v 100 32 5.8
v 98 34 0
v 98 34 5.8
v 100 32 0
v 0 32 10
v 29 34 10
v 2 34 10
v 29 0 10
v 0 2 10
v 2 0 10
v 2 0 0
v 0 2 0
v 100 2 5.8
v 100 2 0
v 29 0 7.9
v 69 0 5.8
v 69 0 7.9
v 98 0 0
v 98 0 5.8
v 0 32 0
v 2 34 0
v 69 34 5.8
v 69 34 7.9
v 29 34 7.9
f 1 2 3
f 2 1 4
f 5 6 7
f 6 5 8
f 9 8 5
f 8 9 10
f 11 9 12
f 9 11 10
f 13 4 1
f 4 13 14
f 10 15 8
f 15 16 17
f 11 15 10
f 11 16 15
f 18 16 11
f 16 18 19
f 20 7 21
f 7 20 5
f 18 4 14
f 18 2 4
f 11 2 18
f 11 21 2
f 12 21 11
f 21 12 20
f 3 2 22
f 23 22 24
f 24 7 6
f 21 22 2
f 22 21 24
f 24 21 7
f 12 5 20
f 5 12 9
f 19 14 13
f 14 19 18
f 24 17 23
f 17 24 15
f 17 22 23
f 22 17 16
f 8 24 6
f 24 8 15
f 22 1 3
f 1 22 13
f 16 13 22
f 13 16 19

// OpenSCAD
$fn = 32;

// ----------------------------------------------------------------------
// Stepped bar: twostep, 100 x 34 x 10/5.8 mm
// ----------------------------------------------------------------------

// --- parameters (mm) ---
bar_l = 100;              // bar length, X
bar_w = 34;               // bar width, Y
plate_t = 10;             // thickness of the thick zone, Z
thin_t = 5.8;             // thickness of the thin zone
corner_c = 2;             // corner chamfer of the bar
step_cut = 4.2;           // material removed from the thin zone
stair1_x = 29;            // position of the first stair
stair2_x = 69;            // position of the second stair
mid_t = 7.9;              // thickness of the middle zone
depth_1 = 2.1;            // depth of cut 1 from the top face
depth_2 = 4.2;            // depth of cut 2 from the top face

profile = [[2, 0], [98, 0], [100, 2], [100, 32], [98, 34], [2, 34], [0, 32], [0, 2]];  // primary outline, 8 points, counter clockwise
void_1 = [[29, -1], [69, -1], [69, 35], [29, 35]];  // first stair, 4 points
void_2 = [[69, -1], [101, -1], [101, 35], [69, 35]];  // second stair, 4 points

// --- the one profile operation ---
difference() {
  linear_extrude(height = plate_t) polygon(points = profile);
  translate([0, 0, plate_t - depth_1])
    linear_extrude(height = depth_1 + 1) polygon(points = void_1);
  translate([0, 0, plate_t - depth_2])
    linear_extrude(height = depth_2 + 1) polygon(points = void_2);
}
